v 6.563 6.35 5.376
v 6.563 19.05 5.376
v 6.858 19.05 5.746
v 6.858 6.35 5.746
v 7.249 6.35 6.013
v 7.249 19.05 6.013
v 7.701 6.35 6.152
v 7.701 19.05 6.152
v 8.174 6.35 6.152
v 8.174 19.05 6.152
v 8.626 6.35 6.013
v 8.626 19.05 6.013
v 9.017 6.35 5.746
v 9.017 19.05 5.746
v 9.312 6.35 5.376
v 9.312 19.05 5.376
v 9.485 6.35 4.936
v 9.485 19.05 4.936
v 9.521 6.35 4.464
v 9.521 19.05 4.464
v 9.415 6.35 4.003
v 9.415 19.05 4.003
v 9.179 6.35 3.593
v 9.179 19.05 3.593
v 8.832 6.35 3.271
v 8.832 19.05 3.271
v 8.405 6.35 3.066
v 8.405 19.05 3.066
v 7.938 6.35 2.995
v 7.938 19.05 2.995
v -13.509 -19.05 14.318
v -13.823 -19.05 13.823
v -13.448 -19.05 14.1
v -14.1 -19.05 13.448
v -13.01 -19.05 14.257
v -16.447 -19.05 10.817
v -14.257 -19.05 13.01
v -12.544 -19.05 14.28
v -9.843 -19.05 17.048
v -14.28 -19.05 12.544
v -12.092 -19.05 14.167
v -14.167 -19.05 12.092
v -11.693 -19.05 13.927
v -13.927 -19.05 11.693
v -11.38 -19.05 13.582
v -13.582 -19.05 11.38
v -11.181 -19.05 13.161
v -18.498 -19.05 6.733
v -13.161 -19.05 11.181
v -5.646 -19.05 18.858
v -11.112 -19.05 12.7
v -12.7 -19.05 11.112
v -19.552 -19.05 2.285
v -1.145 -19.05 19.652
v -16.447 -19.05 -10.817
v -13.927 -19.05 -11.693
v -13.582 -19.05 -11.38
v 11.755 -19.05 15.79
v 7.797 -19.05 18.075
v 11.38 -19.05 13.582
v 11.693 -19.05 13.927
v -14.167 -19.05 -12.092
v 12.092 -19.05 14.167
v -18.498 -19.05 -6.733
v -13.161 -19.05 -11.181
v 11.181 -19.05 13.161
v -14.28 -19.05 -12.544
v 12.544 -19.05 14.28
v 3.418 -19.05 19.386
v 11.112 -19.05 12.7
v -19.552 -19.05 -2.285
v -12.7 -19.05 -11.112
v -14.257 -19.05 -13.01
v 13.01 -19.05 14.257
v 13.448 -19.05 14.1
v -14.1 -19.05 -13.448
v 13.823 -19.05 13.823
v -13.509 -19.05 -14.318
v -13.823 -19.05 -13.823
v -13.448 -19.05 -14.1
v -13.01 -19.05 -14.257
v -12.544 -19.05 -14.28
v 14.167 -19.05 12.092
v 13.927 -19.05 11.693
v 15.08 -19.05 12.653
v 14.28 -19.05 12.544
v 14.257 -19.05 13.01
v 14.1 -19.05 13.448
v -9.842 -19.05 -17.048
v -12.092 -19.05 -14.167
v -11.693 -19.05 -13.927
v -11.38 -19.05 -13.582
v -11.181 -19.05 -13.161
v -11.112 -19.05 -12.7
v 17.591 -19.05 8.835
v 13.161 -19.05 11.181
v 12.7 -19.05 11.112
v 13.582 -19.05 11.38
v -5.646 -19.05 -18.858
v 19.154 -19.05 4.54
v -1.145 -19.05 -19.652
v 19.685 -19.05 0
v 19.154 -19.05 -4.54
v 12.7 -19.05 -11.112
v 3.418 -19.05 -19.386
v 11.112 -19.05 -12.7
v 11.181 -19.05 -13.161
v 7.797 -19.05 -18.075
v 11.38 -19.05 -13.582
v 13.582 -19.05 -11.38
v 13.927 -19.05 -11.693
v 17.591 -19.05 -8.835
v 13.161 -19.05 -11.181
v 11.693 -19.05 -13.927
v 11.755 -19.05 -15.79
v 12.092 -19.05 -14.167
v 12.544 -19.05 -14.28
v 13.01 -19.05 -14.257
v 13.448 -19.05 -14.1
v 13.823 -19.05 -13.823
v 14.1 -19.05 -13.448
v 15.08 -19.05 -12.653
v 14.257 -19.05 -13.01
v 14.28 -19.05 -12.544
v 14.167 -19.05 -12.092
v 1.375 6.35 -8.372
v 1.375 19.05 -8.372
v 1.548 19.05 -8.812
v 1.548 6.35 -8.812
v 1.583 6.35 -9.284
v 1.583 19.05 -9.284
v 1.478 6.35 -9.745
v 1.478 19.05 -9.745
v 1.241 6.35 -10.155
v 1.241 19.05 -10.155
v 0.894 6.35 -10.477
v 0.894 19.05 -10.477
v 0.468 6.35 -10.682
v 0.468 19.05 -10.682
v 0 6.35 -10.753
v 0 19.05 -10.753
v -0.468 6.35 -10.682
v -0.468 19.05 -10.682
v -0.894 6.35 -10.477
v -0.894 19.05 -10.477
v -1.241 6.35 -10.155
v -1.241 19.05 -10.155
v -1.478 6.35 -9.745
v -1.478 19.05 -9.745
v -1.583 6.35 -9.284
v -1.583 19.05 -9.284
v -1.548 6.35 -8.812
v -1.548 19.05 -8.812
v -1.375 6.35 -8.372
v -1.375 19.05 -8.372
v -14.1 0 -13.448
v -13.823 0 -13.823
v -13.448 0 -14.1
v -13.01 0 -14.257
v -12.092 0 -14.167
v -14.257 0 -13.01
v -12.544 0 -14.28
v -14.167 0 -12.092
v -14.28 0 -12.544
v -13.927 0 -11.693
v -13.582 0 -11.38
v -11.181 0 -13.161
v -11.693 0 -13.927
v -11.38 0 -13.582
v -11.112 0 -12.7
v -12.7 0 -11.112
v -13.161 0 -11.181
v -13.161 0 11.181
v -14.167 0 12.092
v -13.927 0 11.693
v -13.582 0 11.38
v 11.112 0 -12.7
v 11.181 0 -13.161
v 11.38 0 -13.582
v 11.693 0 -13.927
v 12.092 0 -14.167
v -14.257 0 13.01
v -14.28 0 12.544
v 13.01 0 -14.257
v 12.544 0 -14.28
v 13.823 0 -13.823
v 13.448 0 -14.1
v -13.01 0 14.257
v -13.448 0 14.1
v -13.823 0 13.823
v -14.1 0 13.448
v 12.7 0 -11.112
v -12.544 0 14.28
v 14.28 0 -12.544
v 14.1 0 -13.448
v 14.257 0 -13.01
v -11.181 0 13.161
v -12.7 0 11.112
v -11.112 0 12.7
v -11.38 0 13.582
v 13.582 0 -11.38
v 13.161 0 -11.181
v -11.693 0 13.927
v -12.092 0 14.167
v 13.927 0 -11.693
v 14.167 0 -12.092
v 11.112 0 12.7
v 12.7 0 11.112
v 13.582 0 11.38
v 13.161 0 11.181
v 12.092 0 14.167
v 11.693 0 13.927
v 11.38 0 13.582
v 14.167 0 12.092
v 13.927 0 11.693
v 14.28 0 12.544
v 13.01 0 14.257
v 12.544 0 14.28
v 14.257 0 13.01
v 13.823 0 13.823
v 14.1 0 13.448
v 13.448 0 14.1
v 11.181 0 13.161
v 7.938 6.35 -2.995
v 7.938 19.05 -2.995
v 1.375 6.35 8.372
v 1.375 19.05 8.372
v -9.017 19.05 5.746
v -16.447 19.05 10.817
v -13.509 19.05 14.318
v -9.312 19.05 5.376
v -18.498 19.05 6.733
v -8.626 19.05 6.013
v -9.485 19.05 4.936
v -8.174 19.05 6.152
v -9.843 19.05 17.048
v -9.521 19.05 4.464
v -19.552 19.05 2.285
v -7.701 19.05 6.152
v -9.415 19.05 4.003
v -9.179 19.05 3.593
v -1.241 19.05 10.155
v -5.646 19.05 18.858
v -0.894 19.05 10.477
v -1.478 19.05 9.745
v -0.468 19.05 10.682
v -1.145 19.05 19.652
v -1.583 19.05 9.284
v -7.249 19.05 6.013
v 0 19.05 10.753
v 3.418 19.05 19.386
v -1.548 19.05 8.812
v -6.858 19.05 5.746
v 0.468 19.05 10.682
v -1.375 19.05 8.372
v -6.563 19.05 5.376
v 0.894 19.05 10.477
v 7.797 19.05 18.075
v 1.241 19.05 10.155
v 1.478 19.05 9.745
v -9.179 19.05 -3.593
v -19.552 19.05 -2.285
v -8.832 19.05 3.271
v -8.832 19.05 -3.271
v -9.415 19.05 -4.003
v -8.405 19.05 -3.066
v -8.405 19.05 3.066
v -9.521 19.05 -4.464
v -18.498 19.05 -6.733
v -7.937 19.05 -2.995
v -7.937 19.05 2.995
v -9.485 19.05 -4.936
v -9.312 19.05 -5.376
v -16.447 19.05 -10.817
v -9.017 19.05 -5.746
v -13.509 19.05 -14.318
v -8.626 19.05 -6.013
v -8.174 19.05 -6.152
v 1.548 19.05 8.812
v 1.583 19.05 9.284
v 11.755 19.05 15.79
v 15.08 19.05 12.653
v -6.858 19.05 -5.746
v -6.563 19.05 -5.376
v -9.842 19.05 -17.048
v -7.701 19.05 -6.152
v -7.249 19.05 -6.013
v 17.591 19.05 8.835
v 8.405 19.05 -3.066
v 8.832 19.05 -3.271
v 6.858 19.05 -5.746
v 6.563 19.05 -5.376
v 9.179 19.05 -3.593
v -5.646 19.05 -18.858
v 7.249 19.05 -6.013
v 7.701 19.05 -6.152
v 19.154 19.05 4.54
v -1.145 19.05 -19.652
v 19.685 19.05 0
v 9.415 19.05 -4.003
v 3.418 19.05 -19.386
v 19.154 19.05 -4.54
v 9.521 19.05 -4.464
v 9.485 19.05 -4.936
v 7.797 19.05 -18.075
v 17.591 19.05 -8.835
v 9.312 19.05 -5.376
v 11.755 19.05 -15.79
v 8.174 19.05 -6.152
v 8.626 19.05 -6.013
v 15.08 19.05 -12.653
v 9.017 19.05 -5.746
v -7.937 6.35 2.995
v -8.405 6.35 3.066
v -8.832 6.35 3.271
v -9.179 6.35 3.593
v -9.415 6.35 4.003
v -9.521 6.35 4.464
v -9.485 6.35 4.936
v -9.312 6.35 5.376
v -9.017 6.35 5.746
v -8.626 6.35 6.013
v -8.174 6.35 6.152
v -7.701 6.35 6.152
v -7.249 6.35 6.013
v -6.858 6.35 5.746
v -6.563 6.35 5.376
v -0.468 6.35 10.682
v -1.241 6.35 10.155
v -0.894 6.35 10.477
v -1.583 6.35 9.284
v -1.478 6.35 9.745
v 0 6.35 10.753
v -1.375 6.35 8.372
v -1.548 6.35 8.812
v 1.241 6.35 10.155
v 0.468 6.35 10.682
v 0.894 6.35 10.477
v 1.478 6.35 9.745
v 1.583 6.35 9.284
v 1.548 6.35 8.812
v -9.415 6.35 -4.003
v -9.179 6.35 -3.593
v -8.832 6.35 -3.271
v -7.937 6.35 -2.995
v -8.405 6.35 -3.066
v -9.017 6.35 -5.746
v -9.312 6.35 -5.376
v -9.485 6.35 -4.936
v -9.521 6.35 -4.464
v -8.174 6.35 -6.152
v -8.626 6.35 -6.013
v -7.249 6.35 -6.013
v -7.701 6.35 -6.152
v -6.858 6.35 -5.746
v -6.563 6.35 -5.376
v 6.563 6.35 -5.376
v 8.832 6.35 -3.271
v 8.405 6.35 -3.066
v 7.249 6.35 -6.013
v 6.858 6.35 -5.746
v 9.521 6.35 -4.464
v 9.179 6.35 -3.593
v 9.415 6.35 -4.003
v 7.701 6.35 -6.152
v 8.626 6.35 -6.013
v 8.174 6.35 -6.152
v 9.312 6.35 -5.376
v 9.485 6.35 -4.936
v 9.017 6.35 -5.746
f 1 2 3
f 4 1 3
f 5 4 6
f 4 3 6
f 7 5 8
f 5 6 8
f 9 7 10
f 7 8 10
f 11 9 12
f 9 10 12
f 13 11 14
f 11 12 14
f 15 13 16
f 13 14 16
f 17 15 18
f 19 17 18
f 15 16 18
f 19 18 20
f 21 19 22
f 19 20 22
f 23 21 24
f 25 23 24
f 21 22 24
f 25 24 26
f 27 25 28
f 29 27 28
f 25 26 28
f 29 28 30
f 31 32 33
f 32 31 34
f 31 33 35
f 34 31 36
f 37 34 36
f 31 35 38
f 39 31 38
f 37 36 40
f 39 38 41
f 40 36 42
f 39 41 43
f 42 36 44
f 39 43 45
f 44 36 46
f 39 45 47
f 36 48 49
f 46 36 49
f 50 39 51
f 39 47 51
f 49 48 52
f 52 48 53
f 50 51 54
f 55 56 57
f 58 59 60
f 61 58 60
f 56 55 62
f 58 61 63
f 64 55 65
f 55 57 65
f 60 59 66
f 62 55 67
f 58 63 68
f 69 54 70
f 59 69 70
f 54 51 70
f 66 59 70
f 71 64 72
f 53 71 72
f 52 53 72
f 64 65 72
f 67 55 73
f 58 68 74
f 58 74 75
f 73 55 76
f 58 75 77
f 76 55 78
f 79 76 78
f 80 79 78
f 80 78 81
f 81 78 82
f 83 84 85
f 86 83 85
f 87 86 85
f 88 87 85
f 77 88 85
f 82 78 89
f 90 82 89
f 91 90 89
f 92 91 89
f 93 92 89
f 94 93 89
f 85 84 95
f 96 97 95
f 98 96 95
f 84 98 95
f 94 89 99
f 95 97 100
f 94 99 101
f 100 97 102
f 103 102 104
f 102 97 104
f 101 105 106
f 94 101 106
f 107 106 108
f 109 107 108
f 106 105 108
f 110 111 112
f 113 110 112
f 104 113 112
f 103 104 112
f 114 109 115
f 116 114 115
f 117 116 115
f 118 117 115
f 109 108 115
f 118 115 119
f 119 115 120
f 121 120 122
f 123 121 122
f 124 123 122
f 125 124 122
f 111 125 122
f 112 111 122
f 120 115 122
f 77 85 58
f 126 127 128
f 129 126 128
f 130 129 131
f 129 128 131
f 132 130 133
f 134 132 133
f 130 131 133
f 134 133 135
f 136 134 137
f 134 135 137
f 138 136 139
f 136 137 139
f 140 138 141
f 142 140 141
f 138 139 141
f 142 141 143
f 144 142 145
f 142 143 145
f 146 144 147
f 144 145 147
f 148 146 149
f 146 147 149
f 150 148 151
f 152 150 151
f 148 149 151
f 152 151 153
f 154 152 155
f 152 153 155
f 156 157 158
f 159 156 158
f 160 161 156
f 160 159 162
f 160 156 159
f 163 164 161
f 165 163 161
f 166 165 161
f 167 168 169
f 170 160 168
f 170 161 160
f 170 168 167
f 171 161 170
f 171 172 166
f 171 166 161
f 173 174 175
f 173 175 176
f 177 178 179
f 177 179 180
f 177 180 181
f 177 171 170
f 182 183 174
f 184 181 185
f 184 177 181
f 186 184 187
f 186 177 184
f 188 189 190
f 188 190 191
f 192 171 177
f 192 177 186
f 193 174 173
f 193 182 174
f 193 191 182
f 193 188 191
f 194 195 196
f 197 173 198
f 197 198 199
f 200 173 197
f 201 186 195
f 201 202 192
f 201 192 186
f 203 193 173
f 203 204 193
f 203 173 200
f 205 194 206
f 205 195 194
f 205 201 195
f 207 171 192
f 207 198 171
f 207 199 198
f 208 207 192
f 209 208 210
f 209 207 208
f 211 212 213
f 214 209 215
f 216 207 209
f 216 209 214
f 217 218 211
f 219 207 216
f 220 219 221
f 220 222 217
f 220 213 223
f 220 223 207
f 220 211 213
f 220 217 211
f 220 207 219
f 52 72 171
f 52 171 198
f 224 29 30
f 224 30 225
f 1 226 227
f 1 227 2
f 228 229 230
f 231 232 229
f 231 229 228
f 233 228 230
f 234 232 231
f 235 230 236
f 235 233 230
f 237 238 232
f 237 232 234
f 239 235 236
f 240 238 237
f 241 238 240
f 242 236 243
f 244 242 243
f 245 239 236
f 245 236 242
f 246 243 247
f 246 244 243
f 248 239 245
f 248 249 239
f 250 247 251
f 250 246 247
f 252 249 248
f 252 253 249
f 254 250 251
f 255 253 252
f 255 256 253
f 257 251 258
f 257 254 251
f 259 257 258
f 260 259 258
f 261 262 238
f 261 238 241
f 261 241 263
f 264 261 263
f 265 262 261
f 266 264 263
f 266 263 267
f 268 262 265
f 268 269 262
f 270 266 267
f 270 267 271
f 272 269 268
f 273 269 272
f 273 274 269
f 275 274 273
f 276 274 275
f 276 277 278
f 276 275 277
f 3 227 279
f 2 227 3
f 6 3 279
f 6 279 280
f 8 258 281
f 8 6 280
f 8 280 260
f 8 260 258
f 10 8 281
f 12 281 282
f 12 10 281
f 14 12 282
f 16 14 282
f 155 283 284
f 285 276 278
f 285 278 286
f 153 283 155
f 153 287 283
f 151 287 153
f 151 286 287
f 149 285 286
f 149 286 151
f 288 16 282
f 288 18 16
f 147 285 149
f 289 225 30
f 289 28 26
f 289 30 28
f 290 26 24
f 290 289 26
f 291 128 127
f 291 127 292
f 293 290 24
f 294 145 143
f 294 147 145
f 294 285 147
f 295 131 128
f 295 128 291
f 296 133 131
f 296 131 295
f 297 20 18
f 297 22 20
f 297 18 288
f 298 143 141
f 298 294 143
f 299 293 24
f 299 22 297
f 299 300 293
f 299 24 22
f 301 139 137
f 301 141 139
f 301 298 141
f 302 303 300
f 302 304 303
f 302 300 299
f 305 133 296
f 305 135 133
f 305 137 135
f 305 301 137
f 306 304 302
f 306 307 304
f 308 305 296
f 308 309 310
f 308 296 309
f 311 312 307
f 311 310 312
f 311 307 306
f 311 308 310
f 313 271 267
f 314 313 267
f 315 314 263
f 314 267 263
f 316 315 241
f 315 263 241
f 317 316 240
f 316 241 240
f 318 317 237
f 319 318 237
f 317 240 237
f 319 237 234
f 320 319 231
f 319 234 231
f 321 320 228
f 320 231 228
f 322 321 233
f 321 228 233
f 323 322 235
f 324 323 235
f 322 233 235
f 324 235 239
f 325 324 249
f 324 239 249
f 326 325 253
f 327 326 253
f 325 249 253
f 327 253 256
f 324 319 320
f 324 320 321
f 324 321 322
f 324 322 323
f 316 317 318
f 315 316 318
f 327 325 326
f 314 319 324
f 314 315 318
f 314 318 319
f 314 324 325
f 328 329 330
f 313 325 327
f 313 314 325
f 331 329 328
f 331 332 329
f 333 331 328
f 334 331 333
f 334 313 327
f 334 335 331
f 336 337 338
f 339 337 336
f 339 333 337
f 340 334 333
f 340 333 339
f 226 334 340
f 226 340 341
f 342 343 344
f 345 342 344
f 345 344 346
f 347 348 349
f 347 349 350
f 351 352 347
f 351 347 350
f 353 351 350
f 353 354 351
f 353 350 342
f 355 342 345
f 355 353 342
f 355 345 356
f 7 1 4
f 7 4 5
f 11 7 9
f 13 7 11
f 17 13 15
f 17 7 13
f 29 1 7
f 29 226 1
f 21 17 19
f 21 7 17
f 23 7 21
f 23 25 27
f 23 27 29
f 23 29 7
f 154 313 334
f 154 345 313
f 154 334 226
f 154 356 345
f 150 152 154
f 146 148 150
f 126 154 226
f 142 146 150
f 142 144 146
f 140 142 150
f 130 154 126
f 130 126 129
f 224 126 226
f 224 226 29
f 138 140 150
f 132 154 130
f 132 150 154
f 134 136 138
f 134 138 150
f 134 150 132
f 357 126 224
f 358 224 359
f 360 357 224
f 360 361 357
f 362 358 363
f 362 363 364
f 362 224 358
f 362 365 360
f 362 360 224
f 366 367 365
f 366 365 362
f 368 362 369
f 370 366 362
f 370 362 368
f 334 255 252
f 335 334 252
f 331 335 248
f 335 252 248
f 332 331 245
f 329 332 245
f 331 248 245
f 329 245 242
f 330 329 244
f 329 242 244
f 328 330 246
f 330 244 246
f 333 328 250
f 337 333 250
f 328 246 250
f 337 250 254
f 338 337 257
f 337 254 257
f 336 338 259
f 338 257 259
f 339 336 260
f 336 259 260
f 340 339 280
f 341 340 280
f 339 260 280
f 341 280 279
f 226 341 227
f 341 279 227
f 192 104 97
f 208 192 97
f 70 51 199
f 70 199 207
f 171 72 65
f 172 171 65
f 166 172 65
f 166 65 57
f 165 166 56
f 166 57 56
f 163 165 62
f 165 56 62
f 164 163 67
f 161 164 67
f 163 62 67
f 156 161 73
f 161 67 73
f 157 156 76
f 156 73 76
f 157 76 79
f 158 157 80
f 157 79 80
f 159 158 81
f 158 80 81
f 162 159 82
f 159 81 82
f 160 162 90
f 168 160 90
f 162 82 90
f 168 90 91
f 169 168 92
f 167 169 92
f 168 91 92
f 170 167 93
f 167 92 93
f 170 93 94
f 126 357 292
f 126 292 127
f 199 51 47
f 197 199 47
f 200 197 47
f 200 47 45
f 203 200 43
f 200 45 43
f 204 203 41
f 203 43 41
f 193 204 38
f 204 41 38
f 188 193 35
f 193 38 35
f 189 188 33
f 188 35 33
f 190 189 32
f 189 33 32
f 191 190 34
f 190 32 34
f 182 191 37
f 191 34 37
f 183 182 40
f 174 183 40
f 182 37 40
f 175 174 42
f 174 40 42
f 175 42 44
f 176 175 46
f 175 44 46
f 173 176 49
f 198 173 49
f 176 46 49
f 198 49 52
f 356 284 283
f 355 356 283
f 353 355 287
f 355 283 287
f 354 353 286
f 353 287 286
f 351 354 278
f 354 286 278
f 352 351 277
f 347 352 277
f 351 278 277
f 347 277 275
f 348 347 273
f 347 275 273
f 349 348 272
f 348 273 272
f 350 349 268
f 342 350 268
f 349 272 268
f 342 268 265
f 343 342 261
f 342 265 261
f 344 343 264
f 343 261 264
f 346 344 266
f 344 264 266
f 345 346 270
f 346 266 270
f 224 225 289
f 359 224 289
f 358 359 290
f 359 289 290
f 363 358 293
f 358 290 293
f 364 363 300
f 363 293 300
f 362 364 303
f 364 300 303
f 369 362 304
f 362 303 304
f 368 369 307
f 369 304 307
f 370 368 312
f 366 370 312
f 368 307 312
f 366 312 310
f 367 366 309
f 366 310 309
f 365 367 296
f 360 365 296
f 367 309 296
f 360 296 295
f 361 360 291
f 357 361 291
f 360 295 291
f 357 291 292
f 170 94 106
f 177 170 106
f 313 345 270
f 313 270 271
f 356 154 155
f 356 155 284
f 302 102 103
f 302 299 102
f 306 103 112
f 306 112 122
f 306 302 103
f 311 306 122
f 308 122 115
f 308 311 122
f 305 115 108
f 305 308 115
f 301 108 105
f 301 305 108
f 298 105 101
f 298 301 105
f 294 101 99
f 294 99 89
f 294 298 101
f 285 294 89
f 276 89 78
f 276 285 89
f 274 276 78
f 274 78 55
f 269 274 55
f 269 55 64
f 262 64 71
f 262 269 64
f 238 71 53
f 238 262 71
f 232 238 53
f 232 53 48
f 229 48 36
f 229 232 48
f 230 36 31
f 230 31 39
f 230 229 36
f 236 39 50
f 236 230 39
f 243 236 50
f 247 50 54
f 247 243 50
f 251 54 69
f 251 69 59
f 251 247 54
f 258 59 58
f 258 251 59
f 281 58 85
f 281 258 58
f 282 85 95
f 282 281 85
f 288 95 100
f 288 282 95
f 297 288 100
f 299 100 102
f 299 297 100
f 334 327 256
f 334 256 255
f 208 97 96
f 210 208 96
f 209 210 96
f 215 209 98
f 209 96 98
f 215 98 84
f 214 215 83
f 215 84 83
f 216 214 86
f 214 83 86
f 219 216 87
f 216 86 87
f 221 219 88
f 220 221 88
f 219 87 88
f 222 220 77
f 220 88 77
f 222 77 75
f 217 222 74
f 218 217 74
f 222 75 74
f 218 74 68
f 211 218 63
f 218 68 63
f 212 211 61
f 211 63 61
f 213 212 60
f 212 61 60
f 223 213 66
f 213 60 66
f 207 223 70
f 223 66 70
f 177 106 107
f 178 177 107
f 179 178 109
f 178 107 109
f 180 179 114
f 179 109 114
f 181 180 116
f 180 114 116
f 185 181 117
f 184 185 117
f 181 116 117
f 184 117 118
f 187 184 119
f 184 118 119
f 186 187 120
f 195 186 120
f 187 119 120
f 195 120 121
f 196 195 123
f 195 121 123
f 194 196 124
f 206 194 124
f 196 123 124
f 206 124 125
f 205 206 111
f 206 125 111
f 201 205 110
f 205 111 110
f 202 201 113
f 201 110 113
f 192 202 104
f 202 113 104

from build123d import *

# Parameters (mm, degrees)
SKETCH3_R           = 19.685
BOSS_EXTRUDE1_DEPTH = 19.05
SKETCH4_R           = 1.5875
SKETCH4_W           = 25.4
SKETCH4_H           = 25.4
CUT_EXTRUDE1_DEPTH  = 19.05
SKETCH5_R           = 1.5875
CUT_EXTRUDE2_DEPTH  = 12.7


with BuildPart() as part:
    # Sketch3 → Boss-Extrude1 (new body, symmetric)
    with BuildSketch(Plane(origin=(0, 0, 0), x_dir=(1, 0, 0), z_dir=(0, 1, 0))):
        Circle(SKETCH3_R)
    extrude(amount=BOSS_EXTRUDE1_DEPTH, both=True)

    # Sketch4 → Cut-Extrude1 (cut)
    with BuildSketch(Plane.XZ.offset(19.05)):
        with Locations((12.7, -12.7)):
            Circle(SKETCH4_R)
        with Locations((-12.7, -12.7)):
            Circle(SKETCH4_R)
        with Locations((-12.7, 12.7)):
            Circle(SKETCH4_R)
        with Locations((12.7, 12.7)):
            Circle(SKETCH4_R)
        Rectangle(SKETCH4_W, SKETCH4_H)
    extrude(amount=-CUT_EXTRUDE1_DEPTH, mode=Mode.SUBTRACT)

    # Sketch5 → Cut-Extrude2 (cut)
    with BuildSketch(Plane(origin=(0, 19.05, 0), x_dir=(1, 0, 0), z_dir=(0, 1, 0))):
        with Locations((7.9375, 4.582717762)):
            Circle(SKETCH5_R)
        with Locations((0, 9.165435523)):
            Circle(SKETCH5_R)
        with Locations((-7.9375, 4.582717762)):
            Circle(SKETCH5_R)
        with Locations((-7.9375, -4.582717762)):
            Circle(SKETCH5_R)
        with Locations((0, -9.165435523)):
            Circle(SKETCH5_R)
        with Locations((7.9375, -4.582717762)):
            Circle(SKETCH5_R)
        Polygon((7.9375, 4.582717762), (0, 9.165435523), (-7.9375, 4.582717762), (-7.9375, -4.582717762), (0, -9.165435523), (7.9375, -4.582717762), align=None)
        with BuildLine():
            ThreePointArc((-6.35, -4.582717762), (-6.814967985, -3.460185747), (-7.9375, -2.995217762))
            Line((-7.9375, -2.995217762), (-7.9375, -4.582717762))
            Line((-7.9375, -4.582717762), (-6.562684671, -5.376467762))
            ThreePointArc((-6.562684671, -5.376467762), (-6.404092751, -4.993592996), (-6.35, -4.582717762))
        make_face()
        with BuildLine():
            Line((-7.9375, -4.582717762), (-7.9375, -2.995217762))
            ThreePointArc((-7.9375, -2.995217762), (-9.312315329, -5.376467762), (-6.562684671, -5.376467762))
            Line((-6.562684671, -5.376467762), (-7.9375, -4.582717762))
        make_face()
        with BuildLine():
            ThreePointArc((1.374815329, -8.371685523), (0, -7.577935523), (-1.374815329, -8.371685523))
            Line((-1.374815329, -8.371685523), (0, -9.165435523))
            Line((0, -9.165435523), (1.374815329, -8.371685523))
        make_face()
        with BuildLine():
            Line((0, -9.165435523), (-1.374815329, -8.371685523))
            ThreePointArc((-1.374815329, -8.371685523), (-0.410875234, -10.698842773), (1.5875, -9.165435523))
            ThreePointArc((1.5875, -9.165435523), (1.533407249, -8.754560289), (1.374815329, -8.371685523))
            Line((1.374815329, -8.371685523), (0, -9.165435523))
        make_face()
        with BuildLine():
            ThreePointArc((9.525, -4.582717762), (9.060032015, -3.460185747), (7.9375, -2.995217762))
            Line((7.9375, -2.995217762), (7.9375, -4.582717762))
            Line((7.9375, -4.582717762), (6.562684671, -5.376467762))
            ThreePointArc((6.562684671, -5.376467762), (8.348375234, -6.116125011), (9.525, -4.582717762))
        make_face()
        with BuildLine():
            Line((7.9375, -4.582717762), (7.9375, -2.995217762))
            ThreePointArc((7.9375, -2.995217762), (6.562684671, -3.788967762), (6.562684671, -5.376467762))
            Line((6.562684671, -5.376467762), (7.9375, -4.582717762))
        make_face()
        with BuildLine():
            ThreePointArc((9.525, 4.582717762), (8.348375234, 6.116125011), (6.562684671, 5.376467762))
            Line((6.562684671, 5.376467762), (7.9375, 4.582717762))
            Line((7.9375, 4.582717762), (7.9375, 2.995217762))
            ThreePointArc((7.9375, 2.995217762), (9.060032015, 3.460185747), (9.525, 4.582717762))
        make_face()
        with BuildLine():
            Line((7.9375, 4.582717762), (6.562684671, 5.376467762))
            ThreePointArc((6.562684671, 5.376467762), (6.562684671, 3.788967762), (7.9375, 2.995217762))
            Line((7.9375, 2.995217762), (7.9375, 4.582717762))
        make_face()
        with BuildLine():
            Line((1.374815329, 8.371685523), (0, 9.165435523))
            Line((0, 9.165435523), (-1.374815329, 8.371685523))
            ThreePointArc((-1.374815329, 8.371685523), (0, 7.577935523), (1.374815329, 8.371685523))
        make_face()
        with BuildLine():
            Line((-1.374815329, 8.371685523), (0, 9.165435523))
            Line((0, 9.165435523), (1.374815329, 8.371685523))
            ThreePointArc((1.374815329, 8.371685523), (1.533407249, 8.754560289), (1.5875, 9.165435523))
            ThreePointArc((1.5875, 9.165435523), (-0.410875234, 10.698842773), (-1.374815329, 8.371685523))
        make_face()
        with BuildLine():
            ThreePointArc((-6.35, 4.582717762), (-6.404092751, 4.993592996), (-6.562684671, 5.376467762))
            Line((-6.562684671, 5.376467762), (-7.9375, 4.582717762))
            Line((-7.9375, 4.582717762), (-7.9375, 2.995217762))
            ThreePointArc((-7.9375, 2.995217762), (-6.814967985, 3.460185747), (-6.35, 4.582717762))
        make_face()
        with BuildLine():
            Line((-7.9375, 4.582717762), (-6.562684671, 5.376467762))
            ThreePointArc((-6.562684671, 5.376467762), (-9.312315329, 5.376467762), (-7.9375, 2.995217762))
            Line((-7.9375, 2.995217762), (-7.9375, 4.582717762))
        make_face()
    extrude(amount=-CUT_EXTRUDE2_DEPTH, mode=Mode.SUBTRACT)


solid = part.part
